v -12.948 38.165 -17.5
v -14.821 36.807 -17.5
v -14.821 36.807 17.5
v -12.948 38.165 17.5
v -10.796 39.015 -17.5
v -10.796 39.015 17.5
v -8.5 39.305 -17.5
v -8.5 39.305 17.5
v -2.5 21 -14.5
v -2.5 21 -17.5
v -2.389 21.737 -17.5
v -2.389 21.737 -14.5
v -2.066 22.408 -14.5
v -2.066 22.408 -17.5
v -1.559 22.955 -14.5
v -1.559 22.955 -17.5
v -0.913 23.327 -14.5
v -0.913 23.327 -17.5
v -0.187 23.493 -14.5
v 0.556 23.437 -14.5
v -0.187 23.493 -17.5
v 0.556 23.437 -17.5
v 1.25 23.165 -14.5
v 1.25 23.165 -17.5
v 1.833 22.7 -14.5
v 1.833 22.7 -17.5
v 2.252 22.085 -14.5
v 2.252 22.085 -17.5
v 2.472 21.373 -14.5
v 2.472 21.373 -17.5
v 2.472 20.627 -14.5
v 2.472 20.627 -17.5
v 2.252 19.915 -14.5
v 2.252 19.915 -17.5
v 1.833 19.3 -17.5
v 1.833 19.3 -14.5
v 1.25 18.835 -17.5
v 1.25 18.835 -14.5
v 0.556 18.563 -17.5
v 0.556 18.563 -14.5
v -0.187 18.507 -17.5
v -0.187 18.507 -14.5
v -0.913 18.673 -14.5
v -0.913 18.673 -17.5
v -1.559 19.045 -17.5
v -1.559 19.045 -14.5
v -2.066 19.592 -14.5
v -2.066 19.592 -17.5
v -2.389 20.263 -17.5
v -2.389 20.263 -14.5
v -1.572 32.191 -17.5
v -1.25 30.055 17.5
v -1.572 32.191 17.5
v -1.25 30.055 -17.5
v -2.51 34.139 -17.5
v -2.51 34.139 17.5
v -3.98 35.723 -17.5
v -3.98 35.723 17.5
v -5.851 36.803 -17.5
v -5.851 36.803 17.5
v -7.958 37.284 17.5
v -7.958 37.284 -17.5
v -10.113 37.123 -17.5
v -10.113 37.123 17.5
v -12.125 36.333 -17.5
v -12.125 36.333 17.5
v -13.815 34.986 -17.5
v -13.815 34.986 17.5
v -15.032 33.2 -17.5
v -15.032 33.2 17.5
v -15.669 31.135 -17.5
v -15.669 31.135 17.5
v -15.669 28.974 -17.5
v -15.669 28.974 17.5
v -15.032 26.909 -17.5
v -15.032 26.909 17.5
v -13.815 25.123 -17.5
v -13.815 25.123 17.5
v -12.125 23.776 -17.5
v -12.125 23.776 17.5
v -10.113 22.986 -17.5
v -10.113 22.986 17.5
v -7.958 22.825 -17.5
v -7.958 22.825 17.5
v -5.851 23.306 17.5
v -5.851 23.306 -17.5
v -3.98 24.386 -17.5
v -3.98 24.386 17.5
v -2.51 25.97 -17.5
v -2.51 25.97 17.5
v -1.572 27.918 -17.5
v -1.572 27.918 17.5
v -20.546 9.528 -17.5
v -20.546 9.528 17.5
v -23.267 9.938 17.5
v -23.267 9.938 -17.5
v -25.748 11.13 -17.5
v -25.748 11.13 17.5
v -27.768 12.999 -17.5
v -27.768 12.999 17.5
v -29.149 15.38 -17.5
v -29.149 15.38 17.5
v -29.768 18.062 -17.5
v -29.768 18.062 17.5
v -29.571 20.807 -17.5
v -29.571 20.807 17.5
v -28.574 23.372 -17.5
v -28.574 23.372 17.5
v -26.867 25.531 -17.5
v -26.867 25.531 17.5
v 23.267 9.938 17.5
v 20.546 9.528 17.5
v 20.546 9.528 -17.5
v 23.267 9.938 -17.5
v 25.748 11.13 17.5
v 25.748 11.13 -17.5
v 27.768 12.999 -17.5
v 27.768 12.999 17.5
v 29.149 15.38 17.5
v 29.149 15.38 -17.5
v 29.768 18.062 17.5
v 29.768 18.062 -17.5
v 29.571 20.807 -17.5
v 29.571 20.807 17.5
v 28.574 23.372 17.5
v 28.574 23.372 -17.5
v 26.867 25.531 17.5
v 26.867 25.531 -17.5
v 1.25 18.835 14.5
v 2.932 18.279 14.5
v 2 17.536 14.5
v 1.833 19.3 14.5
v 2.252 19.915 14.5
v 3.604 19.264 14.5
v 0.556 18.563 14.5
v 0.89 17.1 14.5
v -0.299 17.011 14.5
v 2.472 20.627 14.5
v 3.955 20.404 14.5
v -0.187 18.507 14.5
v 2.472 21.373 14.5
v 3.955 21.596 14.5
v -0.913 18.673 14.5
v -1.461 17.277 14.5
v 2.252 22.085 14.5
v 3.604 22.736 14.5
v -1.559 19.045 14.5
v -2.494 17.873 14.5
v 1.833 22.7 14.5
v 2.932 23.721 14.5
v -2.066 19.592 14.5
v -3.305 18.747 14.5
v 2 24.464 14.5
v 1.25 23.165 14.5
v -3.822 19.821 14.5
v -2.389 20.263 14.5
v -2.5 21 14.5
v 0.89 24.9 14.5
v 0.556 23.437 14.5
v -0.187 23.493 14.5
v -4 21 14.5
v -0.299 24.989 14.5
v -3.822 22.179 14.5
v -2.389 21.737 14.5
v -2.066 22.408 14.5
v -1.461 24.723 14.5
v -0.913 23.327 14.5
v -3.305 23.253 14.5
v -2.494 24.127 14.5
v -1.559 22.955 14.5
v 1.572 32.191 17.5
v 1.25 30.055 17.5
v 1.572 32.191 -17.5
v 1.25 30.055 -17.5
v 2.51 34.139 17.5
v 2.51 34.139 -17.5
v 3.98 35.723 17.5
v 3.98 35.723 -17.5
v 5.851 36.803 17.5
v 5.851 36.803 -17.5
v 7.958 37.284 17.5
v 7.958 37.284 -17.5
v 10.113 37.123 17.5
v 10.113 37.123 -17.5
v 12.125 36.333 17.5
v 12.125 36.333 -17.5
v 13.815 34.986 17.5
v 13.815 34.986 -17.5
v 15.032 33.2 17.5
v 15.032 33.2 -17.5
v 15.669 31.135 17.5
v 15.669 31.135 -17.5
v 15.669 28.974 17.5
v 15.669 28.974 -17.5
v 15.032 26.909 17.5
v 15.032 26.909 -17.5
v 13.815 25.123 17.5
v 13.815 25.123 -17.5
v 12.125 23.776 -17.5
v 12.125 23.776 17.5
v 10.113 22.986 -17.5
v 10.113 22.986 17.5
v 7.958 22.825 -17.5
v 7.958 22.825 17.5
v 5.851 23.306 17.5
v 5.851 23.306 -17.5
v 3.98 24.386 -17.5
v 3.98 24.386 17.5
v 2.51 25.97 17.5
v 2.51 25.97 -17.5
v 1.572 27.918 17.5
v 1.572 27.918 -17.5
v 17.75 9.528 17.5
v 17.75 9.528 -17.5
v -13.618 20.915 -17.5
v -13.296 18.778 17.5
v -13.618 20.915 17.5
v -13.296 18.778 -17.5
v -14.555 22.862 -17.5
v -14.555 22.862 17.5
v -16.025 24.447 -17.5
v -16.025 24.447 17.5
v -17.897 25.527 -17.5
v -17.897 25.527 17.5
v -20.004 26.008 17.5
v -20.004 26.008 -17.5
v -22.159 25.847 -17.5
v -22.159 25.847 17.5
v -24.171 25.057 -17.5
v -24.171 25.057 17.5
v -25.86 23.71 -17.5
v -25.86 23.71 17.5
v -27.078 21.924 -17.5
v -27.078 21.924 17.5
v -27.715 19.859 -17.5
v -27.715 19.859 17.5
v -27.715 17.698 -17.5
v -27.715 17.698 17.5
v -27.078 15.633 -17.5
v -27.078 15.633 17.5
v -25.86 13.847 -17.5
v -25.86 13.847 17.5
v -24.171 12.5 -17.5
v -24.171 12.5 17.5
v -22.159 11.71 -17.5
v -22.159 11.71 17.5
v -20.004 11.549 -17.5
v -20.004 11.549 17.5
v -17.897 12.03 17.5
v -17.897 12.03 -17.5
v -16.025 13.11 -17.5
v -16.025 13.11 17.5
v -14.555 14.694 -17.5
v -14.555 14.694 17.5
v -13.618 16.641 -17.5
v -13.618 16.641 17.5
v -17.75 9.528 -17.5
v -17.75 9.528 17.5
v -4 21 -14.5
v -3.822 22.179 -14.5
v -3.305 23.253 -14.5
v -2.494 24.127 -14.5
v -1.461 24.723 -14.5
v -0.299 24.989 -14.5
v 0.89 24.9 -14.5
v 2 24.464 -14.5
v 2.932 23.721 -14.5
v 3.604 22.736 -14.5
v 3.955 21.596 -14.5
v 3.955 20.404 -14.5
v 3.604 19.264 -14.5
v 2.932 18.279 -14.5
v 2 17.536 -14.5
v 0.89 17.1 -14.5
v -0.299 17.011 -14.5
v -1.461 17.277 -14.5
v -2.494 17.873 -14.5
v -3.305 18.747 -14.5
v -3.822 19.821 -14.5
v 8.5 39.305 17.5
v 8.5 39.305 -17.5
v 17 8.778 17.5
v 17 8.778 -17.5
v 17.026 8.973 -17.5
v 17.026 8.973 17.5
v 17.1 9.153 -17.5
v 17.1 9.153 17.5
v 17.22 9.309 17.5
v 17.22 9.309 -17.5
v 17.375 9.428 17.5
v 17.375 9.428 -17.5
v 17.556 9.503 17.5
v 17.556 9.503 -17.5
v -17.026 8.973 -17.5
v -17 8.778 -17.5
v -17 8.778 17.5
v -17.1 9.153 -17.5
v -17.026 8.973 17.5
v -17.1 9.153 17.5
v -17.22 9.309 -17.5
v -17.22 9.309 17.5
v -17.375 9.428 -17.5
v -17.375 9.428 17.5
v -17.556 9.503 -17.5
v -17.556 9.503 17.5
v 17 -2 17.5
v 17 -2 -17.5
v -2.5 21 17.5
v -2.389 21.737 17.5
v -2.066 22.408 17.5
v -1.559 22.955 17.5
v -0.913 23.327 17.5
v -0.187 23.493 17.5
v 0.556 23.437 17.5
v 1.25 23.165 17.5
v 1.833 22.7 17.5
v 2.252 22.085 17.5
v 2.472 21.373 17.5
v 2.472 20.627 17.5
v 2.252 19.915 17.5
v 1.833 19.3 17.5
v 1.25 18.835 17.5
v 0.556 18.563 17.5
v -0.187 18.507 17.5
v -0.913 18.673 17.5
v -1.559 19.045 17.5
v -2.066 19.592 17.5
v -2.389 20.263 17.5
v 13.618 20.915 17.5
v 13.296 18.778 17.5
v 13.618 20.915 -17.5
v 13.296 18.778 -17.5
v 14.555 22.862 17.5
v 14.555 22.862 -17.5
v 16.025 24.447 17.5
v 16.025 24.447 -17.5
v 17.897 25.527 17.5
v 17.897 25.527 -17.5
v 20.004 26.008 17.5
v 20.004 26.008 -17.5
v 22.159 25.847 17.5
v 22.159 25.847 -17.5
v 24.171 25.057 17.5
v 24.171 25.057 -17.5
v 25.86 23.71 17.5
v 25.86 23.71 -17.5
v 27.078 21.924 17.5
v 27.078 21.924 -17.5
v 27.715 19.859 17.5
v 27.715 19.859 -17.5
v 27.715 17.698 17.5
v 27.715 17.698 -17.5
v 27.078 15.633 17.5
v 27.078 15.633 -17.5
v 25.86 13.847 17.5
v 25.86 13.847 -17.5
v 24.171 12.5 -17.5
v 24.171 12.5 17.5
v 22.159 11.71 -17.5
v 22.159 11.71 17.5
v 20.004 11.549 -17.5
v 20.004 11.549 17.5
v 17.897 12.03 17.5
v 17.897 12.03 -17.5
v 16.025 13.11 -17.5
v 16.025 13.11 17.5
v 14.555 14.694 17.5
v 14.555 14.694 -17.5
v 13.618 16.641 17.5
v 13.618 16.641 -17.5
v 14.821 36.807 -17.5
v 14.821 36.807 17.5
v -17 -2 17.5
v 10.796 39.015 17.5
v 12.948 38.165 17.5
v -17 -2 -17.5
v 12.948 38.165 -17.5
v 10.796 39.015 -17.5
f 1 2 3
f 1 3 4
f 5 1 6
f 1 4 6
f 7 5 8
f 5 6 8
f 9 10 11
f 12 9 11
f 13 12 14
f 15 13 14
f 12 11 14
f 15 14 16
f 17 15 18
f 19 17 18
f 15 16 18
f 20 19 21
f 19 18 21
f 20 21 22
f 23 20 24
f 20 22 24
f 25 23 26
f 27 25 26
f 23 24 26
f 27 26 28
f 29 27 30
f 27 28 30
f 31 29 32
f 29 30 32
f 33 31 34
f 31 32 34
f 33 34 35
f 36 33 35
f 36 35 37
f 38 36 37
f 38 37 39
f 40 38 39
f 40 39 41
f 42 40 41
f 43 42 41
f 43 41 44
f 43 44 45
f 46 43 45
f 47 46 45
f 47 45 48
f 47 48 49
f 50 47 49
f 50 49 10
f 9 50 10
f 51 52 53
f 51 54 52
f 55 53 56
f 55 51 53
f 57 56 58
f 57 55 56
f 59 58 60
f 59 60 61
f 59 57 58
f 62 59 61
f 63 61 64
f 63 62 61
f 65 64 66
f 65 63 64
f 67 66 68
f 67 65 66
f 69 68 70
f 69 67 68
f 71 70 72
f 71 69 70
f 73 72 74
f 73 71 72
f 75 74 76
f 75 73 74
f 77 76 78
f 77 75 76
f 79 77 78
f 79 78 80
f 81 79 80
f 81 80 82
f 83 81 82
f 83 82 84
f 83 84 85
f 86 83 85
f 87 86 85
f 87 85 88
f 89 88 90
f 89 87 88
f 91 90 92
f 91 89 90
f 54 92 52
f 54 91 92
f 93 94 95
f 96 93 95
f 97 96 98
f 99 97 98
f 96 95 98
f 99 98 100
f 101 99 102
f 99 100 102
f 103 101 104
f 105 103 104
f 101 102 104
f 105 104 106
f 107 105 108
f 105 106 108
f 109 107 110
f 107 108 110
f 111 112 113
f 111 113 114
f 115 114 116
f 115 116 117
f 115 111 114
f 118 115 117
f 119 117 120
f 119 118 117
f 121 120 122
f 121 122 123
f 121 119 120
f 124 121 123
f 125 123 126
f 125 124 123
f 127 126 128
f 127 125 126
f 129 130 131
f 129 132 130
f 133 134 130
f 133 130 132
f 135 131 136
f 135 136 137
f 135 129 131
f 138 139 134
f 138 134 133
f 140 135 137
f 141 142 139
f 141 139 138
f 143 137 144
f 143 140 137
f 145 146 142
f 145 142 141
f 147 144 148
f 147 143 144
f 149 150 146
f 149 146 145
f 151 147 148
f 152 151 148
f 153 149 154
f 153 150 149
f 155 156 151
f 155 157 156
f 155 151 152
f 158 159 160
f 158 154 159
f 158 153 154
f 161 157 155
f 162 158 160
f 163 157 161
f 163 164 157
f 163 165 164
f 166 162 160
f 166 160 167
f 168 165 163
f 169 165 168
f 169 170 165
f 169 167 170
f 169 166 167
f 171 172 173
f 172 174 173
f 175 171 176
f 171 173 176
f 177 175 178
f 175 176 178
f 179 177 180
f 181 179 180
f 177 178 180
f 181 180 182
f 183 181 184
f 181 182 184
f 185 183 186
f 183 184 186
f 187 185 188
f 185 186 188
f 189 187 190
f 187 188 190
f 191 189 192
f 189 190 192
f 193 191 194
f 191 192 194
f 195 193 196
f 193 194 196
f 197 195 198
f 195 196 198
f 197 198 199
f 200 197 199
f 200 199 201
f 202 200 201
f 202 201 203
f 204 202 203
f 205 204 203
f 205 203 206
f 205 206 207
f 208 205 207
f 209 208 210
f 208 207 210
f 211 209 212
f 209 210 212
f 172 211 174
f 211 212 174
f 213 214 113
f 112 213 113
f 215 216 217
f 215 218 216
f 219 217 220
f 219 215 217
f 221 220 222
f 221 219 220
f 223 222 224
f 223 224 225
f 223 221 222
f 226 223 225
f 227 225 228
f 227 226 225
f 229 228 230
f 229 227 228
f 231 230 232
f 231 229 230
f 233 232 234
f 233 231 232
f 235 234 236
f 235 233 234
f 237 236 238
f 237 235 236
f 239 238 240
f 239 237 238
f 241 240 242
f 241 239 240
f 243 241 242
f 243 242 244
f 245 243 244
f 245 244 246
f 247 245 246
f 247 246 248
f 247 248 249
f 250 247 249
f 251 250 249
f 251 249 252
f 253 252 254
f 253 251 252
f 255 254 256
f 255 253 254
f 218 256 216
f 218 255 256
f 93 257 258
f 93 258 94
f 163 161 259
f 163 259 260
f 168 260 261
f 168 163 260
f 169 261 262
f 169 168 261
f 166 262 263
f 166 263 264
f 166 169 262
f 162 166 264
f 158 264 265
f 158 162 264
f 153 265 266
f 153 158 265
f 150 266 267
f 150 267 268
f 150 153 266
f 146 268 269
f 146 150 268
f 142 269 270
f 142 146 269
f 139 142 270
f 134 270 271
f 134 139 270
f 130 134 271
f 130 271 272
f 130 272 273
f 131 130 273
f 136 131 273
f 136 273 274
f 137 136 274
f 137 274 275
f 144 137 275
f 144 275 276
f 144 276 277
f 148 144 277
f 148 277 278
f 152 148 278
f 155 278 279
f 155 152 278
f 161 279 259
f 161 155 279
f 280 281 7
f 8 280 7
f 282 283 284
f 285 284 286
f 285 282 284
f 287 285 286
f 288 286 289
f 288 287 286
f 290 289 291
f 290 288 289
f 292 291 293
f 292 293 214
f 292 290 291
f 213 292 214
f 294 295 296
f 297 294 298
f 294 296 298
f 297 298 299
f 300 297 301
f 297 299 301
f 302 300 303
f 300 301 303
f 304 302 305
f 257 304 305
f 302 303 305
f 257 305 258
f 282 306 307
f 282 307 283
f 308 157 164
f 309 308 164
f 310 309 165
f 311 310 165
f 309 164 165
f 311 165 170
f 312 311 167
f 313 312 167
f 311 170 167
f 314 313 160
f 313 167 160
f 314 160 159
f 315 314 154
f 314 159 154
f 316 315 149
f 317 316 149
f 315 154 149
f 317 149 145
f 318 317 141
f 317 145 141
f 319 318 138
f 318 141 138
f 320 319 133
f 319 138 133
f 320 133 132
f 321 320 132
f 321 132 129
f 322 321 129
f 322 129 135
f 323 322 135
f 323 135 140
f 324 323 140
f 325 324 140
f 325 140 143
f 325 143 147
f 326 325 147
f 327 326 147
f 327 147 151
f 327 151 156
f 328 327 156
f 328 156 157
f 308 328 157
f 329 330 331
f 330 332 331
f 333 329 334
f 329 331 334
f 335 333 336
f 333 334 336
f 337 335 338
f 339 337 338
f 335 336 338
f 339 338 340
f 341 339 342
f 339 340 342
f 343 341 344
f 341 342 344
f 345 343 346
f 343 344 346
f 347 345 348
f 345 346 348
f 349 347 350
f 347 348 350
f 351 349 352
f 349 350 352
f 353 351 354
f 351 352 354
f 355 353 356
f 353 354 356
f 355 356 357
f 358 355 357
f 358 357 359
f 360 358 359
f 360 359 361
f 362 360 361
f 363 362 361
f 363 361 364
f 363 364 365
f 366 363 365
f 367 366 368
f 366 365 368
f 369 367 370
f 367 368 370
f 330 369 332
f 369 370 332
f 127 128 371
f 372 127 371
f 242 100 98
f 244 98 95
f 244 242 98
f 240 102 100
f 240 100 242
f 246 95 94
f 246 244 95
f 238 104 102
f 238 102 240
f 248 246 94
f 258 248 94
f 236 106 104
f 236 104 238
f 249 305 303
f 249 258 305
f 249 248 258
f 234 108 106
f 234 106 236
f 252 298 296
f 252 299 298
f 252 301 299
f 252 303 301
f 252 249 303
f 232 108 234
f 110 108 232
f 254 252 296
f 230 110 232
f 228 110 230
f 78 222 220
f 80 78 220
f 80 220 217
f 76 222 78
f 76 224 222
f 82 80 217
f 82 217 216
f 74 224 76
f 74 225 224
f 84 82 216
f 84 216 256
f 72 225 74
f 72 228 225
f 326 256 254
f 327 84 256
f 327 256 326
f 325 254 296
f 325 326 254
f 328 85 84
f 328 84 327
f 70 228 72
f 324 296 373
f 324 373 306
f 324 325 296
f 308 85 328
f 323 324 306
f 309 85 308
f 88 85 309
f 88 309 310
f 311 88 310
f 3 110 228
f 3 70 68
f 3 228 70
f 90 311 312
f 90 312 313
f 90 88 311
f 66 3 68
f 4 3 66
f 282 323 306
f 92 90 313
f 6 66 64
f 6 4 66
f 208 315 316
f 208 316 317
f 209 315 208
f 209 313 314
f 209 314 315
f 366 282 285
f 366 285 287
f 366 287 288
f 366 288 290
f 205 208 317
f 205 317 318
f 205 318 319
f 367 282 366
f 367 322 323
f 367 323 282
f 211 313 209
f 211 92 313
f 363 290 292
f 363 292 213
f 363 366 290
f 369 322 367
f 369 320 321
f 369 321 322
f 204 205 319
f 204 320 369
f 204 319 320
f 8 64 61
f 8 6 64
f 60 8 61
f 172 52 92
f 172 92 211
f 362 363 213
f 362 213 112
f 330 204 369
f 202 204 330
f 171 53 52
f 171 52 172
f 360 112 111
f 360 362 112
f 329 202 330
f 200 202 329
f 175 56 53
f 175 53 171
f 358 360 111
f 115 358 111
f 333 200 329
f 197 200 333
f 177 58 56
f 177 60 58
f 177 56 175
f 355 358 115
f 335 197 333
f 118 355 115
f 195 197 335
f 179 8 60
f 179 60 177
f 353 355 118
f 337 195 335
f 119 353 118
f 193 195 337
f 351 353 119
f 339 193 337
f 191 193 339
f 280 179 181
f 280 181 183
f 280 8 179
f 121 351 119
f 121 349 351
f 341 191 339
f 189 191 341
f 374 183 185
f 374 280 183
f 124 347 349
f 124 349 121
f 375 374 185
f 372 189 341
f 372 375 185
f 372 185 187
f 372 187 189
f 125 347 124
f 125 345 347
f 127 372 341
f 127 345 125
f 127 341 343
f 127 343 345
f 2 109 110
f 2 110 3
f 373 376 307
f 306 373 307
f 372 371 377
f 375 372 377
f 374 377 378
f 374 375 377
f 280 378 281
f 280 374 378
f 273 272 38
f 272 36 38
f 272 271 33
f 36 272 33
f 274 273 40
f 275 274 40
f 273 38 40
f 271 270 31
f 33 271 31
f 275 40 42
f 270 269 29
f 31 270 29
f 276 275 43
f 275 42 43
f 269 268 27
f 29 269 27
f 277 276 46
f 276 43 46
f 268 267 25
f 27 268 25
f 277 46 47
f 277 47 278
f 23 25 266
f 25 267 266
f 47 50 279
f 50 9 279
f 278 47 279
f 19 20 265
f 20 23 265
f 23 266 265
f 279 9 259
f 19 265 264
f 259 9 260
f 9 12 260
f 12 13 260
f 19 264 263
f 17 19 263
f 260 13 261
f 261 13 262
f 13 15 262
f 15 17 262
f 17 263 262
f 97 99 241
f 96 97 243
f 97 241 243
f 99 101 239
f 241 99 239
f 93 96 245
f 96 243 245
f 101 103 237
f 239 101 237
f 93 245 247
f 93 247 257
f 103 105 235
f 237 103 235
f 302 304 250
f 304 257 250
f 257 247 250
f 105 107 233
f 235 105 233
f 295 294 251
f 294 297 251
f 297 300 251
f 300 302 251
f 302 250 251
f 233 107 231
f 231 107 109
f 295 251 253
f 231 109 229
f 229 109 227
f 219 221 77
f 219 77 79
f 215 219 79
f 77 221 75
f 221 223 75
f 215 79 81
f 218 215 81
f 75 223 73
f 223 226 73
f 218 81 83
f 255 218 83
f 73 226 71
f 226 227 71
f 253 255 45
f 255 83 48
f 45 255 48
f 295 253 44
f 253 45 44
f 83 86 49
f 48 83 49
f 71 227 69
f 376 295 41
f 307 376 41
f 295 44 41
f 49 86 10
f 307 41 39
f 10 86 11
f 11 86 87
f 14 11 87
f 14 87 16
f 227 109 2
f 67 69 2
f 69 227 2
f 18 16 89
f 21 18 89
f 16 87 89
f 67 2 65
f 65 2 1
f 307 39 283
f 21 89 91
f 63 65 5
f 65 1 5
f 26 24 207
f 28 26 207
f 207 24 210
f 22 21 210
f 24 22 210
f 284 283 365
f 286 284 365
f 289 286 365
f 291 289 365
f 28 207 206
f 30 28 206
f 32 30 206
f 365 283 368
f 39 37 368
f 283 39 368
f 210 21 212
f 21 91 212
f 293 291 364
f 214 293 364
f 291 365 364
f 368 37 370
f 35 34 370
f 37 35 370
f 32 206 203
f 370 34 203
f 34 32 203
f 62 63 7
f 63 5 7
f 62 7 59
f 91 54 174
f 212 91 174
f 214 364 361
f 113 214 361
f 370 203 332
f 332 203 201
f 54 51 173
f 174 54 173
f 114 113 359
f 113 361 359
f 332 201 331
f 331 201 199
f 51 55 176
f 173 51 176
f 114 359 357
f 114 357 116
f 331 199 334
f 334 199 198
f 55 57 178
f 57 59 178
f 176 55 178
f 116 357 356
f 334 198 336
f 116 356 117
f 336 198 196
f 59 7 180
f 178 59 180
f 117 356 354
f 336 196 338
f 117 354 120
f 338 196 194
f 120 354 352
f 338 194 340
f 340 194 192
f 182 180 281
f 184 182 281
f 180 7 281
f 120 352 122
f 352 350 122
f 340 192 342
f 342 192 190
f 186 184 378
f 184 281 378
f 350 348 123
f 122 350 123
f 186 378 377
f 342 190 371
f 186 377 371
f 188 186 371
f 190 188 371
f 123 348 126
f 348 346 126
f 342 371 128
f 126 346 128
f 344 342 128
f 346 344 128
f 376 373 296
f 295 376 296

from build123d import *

# Parameters (mm, degrees)
SKETCH1_R           = 7.25
BOSS_EXTRUDE1_DEPTH = 17.5
SKETCH2_R           = 2.5
CUT_EXTRUDE1_DEPTH  = 61.478337768
CUT_EXTRUDE2_START  = -32
SKETCH3_R           = 4
CUT_EXTRUDE2_DEPTH  = 29


with BuildPart() as part:
    # Sketch1 → Boss-Extrude1 (new, symmetric)
    with BuildSketch(Plane.XY):
        with BuildLine():
            ThreePointArc((-20.545709694, 9.528396762), (-29.148813935, 15.380000463), (-26.867170799, 25.531294621))
            Line((-26.867170799, 25.531294621), (-14.821461106, 36.807414431))
            ThreePointArc((-14.821461106, 36.807414431), (-11.898396299, 38.657620814), (-8.5, 39.304516572))
            Line((-8.5, 39.304516572), (0, 39.304516572))
            Line((0, 39.304516572), (0, -2))
            Line((0, -2), (-17, -2))
            Line((-17, -2), (-17, 8.778396762))
            ThreePointArc((-17, 8.778396762), (-17.219669914, 9.308726848), (-17.75, 9.528396762))
            Line((-17.75, 9.528396762), (-20.545709694, 9.528396762))
        make_face()
        with Locations((-8.5, 30.054516572)):
            Circle(SKETCH1_R, mode=Mode.SUBTRACT)
        with Locations((-20.545709694, 18.778396762)):
            Circle(SKETCH1_R, mode=Mode.SUBTRACT)
    boss_extrude1 = extrude(amount=BOSS_EXTRUDE1_DEPTH, both=True)

    # Mirror1: Boss-Extrude1 across plane
    add(boss_extrude1.mirror(Plane(origin=(0, 0, 0), x_dir=(0, 0, 1), z_dir=(1, 0, 0))))

    # Sketch2 → Cut-Extrude1 (cut, through all)
    with BuildSketch(Plane(origin=(0, 0, -17.5), x_dir=(-1, 0, 0), z_dir=(0, 0, -1))):
        with Locations((0, 21)):
            Circle(SKETCH2_R)
    extrude(amount=-CUT_EXTRUDE1_DEPTH, mode=Mode.SUBTRACT)

    # Sketch3 → Cut-Extrude2 (cut)
    with BuildSketch(Plane(origin=(0, 0, -17.5), x_dir=(-1, 0, 0), z_dir=(0, 0, -1)).offset(CUT_EXTRUDE2_START)):
        with Locations((0, 21)):
            Circle(SKETCH3_R)
    extrude(amount=CUT_EXTRUDE2_DEPTH, mode=Mode.SUBTRACT)


solid = part.part
